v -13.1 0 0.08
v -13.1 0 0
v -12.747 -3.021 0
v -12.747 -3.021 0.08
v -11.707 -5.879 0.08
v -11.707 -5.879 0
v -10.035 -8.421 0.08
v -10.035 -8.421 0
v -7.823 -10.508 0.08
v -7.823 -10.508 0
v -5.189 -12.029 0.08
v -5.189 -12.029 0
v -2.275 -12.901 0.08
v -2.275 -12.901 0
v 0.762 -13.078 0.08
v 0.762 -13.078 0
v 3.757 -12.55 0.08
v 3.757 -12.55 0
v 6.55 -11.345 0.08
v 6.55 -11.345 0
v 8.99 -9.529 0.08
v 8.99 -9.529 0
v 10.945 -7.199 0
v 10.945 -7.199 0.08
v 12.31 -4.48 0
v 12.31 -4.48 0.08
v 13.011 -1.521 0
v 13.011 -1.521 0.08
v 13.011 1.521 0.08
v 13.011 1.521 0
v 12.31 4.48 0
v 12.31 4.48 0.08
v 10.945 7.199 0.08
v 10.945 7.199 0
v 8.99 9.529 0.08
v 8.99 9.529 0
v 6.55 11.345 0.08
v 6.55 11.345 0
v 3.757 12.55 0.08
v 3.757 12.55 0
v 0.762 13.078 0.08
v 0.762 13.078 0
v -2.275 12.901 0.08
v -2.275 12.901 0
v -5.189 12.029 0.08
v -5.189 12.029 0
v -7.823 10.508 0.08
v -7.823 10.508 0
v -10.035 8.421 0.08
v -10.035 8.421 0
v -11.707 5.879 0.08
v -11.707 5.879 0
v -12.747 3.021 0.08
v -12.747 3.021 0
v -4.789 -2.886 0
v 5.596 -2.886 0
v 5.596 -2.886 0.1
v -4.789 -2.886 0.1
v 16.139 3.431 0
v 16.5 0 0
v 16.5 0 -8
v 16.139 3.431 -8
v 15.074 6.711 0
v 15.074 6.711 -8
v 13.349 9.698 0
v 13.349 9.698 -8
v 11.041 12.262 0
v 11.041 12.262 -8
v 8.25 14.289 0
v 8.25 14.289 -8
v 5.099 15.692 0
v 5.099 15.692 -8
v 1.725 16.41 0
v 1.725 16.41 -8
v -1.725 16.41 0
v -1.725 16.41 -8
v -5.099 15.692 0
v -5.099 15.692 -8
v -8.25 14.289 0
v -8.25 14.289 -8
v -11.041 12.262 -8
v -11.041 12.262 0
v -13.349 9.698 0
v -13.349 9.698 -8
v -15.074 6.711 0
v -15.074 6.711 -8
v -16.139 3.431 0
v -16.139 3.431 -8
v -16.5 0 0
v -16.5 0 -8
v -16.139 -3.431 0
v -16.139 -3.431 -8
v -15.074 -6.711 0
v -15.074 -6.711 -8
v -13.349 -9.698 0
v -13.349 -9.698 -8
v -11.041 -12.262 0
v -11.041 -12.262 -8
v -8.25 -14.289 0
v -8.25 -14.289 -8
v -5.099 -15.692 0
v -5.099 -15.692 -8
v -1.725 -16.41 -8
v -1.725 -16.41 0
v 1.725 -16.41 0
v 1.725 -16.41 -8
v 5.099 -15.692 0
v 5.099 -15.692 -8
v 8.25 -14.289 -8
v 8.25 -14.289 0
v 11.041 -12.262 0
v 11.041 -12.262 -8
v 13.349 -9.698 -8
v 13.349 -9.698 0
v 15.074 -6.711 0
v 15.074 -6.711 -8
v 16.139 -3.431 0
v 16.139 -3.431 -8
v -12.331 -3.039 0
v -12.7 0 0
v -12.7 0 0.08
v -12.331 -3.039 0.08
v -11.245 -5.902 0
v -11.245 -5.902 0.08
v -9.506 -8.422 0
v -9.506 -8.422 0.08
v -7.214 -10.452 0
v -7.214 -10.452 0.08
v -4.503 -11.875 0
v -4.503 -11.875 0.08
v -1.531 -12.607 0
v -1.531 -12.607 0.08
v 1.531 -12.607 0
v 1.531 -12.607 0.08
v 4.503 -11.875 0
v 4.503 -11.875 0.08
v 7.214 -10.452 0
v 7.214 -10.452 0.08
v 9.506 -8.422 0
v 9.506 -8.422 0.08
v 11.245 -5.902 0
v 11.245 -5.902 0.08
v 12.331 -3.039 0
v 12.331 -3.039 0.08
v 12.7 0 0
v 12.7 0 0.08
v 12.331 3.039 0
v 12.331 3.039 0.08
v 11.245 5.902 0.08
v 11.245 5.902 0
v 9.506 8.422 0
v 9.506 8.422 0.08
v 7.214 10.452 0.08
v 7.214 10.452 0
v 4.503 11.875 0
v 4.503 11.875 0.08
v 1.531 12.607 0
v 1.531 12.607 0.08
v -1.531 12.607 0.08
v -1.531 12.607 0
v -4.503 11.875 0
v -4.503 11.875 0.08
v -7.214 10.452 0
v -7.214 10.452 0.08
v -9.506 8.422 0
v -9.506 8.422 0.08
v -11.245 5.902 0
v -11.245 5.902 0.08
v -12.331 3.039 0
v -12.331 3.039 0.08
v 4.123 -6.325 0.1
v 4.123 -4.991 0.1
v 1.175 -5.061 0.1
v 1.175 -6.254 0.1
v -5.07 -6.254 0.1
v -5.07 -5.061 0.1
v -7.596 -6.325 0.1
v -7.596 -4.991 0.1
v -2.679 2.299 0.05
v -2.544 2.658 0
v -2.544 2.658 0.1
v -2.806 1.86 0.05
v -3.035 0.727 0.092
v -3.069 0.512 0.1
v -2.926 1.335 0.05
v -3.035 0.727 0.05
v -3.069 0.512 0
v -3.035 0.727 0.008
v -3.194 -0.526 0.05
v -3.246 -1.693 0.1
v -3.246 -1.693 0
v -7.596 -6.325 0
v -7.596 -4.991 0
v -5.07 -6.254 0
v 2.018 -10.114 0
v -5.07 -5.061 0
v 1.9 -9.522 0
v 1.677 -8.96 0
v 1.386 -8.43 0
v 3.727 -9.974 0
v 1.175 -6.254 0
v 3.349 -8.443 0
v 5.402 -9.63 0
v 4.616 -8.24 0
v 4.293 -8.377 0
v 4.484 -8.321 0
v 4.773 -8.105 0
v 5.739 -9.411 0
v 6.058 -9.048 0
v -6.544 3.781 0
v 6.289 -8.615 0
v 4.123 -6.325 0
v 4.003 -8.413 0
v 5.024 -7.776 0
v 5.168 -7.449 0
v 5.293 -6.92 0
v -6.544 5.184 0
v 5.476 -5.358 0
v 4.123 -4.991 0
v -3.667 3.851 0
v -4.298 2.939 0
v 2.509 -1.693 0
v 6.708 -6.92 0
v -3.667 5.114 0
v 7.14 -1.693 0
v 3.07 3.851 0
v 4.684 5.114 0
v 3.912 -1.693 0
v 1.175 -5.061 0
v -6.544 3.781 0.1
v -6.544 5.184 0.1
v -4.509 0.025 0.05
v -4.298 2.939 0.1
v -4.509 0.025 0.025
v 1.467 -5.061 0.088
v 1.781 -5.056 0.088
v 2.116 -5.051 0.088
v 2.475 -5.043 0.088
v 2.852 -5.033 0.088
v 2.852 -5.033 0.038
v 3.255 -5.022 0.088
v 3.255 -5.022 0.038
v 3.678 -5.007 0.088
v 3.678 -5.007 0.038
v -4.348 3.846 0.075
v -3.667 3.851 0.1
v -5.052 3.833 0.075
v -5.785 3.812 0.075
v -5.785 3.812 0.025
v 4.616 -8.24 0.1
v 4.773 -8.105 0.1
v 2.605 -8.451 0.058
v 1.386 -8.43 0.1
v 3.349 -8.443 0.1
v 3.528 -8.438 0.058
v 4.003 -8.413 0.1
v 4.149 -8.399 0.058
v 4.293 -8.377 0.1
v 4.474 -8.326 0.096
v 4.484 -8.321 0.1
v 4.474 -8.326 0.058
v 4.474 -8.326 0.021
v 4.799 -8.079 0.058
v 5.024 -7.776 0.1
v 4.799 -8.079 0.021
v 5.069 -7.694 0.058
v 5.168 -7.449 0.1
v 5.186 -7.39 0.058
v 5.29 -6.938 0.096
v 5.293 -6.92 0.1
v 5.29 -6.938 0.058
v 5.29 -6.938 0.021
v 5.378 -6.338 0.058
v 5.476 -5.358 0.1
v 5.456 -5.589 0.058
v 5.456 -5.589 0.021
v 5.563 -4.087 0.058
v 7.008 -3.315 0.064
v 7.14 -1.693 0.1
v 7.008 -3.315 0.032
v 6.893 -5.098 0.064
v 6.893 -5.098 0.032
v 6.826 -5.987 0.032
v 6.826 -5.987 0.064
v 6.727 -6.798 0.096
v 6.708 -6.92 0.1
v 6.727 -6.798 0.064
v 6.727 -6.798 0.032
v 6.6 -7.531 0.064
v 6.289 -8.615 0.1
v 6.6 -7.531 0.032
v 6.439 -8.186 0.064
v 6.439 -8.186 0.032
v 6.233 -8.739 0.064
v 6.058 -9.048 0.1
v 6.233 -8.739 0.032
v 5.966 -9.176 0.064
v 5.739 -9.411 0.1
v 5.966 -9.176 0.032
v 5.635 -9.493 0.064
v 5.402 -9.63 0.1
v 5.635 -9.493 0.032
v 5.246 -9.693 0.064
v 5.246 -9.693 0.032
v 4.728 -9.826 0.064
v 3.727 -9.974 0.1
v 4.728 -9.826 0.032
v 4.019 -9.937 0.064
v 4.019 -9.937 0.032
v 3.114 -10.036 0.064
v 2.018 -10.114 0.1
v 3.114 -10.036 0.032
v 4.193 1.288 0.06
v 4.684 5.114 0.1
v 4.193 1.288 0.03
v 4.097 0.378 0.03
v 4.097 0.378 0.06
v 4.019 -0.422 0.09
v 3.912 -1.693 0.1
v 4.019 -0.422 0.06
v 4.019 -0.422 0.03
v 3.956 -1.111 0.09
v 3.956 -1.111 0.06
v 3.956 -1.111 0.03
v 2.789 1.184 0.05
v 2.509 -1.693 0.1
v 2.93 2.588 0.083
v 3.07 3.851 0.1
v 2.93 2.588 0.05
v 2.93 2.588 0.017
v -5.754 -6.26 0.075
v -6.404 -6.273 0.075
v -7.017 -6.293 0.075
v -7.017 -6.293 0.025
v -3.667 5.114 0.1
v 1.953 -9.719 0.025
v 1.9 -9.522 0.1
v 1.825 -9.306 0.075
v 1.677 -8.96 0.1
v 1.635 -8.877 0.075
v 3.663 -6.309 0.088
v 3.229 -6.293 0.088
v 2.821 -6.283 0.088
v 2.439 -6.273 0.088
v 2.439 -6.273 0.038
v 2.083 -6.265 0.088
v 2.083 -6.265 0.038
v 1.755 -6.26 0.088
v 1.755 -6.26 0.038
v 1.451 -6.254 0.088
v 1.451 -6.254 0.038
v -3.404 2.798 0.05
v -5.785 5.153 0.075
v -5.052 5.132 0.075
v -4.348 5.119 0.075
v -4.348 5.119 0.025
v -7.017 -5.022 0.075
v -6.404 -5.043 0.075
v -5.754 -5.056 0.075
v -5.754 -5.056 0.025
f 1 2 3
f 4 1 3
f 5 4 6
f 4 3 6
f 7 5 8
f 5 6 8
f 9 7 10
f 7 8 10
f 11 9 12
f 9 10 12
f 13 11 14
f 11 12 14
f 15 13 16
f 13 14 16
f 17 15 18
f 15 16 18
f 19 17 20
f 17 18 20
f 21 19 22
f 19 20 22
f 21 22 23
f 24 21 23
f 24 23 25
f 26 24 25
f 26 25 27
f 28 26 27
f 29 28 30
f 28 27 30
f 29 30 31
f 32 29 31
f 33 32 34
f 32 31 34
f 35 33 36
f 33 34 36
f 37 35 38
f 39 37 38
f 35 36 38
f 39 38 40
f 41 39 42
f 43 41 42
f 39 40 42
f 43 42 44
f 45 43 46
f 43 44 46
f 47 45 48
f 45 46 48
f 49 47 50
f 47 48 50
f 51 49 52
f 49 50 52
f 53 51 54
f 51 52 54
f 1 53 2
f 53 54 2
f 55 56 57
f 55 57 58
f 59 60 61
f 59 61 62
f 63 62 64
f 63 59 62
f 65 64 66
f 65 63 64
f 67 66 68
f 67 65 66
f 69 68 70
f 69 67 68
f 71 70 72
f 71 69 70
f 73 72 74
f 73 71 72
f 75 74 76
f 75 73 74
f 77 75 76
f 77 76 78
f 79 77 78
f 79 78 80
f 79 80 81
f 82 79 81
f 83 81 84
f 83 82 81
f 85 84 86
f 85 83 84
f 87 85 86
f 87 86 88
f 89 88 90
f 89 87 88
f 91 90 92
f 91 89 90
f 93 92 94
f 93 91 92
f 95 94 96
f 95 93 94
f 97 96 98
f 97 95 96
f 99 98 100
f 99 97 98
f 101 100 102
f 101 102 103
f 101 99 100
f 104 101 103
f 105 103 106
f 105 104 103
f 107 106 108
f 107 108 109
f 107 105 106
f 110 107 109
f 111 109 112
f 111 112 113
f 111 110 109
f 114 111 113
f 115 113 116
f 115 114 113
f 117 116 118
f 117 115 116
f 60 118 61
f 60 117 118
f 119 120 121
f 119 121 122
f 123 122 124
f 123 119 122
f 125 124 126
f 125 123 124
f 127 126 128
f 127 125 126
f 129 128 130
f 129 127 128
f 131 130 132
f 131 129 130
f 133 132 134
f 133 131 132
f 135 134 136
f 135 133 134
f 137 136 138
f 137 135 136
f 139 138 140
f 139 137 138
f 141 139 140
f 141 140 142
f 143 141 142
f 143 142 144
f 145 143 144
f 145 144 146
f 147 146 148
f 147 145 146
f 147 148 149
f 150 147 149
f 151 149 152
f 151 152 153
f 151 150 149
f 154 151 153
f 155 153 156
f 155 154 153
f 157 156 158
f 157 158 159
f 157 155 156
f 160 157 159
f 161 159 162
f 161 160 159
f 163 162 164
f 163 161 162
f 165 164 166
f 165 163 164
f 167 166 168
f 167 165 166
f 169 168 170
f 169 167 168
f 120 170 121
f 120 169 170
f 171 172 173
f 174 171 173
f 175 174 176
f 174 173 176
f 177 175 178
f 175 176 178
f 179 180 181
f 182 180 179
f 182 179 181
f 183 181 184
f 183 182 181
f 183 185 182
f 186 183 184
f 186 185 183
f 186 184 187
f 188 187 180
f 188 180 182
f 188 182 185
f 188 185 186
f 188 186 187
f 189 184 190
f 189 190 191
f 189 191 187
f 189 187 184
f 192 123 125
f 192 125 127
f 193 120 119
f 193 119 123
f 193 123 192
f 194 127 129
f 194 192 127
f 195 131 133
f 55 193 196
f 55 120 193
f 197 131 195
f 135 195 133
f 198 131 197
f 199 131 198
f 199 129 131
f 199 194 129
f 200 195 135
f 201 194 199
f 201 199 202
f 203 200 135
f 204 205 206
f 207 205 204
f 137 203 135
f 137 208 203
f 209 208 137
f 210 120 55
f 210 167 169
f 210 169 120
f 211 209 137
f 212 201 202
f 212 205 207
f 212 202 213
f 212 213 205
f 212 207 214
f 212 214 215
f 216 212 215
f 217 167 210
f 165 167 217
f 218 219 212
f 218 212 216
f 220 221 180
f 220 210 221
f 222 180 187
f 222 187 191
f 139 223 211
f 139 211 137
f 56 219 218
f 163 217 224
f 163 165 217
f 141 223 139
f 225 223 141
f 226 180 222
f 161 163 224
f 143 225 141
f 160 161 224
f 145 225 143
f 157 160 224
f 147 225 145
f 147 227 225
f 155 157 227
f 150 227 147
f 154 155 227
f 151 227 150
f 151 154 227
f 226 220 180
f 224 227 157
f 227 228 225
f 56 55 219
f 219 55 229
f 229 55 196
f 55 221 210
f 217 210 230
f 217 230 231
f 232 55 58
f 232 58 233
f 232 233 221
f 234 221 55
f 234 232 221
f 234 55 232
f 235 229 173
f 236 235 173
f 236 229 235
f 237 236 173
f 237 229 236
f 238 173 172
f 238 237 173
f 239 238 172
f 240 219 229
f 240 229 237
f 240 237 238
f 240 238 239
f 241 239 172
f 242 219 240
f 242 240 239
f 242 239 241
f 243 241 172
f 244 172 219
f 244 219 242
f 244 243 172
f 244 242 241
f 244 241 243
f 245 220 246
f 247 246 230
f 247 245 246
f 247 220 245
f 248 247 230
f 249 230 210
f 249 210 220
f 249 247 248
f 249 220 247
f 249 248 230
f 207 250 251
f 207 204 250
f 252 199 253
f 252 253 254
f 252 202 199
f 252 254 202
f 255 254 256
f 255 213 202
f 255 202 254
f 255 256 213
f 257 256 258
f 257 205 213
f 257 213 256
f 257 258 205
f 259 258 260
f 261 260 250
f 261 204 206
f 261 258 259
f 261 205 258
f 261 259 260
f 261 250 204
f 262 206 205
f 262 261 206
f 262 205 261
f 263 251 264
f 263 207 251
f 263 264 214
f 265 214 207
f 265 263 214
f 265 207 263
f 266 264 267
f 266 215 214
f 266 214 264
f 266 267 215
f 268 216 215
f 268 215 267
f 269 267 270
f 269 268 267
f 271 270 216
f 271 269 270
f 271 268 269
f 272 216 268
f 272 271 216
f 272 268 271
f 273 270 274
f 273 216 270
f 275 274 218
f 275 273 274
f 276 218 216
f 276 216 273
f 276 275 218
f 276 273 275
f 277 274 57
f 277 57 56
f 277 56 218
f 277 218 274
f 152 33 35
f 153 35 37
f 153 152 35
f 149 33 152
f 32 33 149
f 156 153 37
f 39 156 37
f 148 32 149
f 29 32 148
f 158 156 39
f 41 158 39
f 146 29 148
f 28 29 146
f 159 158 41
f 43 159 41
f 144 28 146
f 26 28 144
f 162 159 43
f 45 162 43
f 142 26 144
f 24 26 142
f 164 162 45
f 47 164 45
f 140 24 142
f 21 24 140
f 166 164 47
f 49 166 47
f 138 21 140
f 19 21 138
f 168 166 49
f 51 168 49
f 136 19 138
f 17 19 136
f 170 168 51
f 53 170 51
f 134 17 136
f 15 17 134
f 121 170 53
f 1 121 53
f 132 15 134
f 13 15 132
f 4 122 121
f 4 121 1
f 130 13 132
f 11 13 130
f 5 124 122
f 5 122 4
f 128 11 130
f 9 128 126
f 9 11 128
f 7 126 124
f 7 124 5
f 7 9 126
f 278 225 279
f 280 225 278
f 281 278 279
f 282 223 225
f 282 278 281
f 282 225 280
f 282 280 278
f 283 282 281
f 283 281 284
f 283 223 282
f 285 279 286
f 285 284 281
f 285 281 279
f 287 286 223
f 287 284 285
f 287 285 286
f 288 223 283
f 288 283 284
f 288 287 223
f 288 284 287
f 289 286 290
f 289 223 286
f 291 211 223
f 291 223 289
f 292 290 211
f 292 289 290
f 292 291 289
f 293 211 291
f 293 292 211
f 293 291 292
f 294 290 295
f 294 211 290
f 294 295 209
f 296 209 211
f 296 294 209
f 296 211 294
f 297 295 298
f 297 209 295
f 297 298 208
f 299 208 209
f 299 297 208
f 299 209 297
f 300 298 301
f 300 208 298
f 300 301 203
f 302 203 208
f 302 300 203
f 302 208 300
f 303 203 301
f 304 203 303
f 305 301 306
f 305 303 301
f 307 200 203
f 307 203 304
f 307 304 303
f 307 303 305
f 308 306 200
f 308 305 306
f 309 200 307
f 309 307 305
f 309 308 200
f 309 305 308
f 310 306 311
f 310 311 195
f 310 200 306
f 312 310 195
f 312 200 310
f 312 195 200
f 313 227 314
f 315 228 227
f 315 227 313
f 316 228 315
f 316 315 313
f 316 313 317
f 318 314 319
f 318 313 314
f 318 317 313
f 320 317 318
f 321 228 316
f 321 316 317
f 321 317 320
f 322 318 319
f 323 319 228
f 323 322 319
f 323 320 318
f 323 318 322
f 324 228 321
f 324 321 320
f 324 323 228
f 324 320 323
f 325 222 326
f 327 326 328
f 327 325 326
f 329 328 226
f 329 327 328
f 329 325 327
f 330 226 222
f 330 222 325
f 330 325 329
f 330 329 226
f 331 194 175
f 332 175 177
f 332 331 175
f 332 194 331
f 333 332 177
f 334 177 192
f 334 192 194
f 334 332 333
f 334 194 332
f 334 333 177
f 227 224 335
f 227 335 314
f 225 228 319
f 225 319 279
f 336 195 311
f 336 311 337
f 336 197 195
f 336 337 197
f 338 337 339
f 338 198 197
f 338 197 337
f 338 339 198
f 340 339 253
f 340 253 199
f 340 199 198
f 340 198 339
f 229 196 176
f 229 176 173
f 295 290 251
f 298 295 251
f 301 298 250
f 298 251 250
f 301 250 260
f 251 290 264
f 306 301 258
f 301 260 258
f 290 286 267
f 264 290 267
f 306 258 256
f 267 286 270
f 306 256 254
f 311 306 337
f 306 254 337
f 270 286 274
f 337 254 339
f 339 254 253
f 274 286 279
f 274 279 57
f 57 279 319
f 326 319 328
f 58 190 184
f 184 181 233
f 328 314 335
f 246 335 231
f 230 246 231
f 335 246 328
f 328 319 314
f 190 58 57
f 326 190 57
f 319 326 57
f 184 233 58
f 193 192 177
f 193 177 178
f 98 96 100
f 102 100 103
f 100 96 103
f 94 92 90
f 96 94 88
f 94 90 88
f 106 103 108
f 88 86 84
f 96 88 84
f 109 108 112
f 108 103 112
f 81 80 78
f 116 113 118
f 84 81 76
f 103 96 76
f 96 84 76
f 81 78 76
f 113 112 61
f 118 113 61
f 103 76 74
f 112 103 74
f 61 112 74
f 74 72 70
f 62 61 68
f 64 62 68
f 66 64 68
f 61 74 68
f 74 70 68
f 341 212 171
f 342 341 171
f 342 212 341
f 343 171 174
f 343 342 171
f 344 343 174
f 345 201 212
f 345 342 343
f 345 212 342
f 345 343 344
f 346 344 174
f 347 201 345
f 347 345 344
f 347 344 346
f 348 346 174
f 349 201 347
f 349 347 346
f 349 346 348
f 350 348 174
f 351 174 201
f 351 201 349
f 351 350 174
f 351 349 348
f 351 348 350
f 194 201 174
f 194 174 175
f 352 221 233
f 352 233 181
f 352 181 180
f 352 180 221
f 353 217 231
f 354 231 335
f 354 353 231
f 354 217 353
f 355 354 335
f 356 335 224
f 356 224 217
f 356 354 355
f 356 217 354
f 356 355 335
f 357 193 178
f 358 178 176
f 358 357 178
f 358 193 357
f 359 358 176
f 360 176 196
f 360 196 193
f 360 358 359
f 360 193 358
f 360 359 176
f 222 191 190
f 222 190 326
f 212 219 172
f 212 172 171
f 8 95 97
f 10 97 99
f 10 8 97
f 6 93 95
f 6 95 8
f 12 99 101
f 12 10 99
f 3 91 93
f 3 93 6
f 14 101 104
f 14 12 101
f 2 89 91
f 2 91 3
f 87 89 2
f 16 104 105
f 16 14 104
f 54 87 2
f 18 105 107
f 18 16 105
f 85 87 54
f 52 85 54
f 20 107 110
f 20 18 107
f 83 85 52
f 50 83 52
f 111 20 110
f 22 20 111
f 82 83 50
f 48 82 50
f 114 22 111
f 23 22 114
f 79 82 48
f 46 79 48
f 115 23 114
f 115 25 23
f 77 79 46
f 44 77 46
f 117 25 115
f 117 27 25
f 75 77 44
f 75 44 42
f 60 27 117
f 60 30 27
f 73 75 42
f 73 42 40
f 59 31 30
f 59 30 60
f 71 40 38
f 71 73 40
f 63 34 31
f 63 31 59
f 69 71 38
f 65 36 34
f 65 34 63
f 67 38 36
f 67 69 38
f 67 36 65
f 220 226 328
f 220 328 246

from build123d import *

# Parameters (mm, degrees)
SKETCH_1_R               = 16.5
DIAMETER33_HEIGHT8_DEPTH = 8
CHARACTER_DEPTH          = 0.1
SKETCH_3_R               = 13.1
SKETCH_3_R_2             = 12.7
INK_RING_DEPTH           = 0.08


with BuildPart() as part:
    # 草图1 → Diameter33_Height8 (new body)
    with BuildSketch(Plane.XY):
        Circle(SKETCH_1_R)
    extrude(amount=-DIAMETER33_HEIGHT8_DEPTH)

    # 草图2 → Character_马 (add)
    with BuildSketch(Plane.XY):
        with BuildLine():
            add(Edge.make_bspline(
                [(-2.543859649, 2.657894737), (-2.568109523, 2.601908638), (-2.618944351, 2.484545403), (-2.68091831, 2.29374228), (-2.747882739, 2.084905171), (-2.809197893, 1.853949883), (-2.867938942, 1.601351852), (-2.929388828, 1.329074257), (-2.981674213, 1.034530608), (-3.05538164, 0.620649676), (-3.127595616, 0.098084884), (-3.197623224, -0.517816396), (-3.237414282, -1.112851594), (-3.242919292, -1.502329954), (-3.245614035, -1.692982456)],
                knots=[0, 0, 0, 0, 0.495689669, 1.0391105, 1.629386371, 2.27856569, 2.980637221, 3.737641002, 4.547078417, 5.411969332, 7.15491927, 8.834024839, 10.450232028, 12, 12, 12, 12], degree=3))
            Line((-3.245614035, -1.692982456), (2.50877193, -1.692982456))
            add(Edge.make_bspline(
                [(2.50877193, -1.692982456), (2.555842668, -1.219109546), (2.651092154, -0.26020911), (2.765765857, 0.939059138), (2.857689962, 1.892225125), (2.928191701, 2.576627854), (2.997770846, 3.225611417), (3.046502797, 3.646446892), (3.070175439, 3.850877193)],
                knots=[0, 0, 0, 0, 1.538264342, 3.112738277, 3.891618687, 4.631513556, 5.335226919, 6, 6, 6, 6], degree=3))
            Line((3.070175439, 3.850877193), (-3.666666667, 3.850877193))
            add(Edge.make_bspline(
                [(-3.666666667, 3.850877193), (-3.893660384, 3.849684604), (-4.355478431, 3.847258285), (-5.06158577, 3.833290973), (-5.793776141, 3.813732), (-6.290908298, 3.791840575), (-6.543859649, 3.780701754)],
                knots=[0, 0, 0, 0, 0.946376728, 1.925400653, 2.944399995, 4, 4, 4, 4], degree=3))
            Line((-6.543859649, 3.780701754), (-6.543859649, 5.184210526))
            add(Edge.make_bspline(
                [(-6.543859649, 5.184210526), (-6.290908298, 5.173071706), (-5.793776141, 5.15118028), (-5.06158577, 5.131621308), (-4.355478431, 5.117653996), (-3.893660384, 5.115227677), (-3.666666667, 5.114035088)],
                knots=[0, 0, 0, 0, 1.055600005, 2.074599347, 3.053623272, 4, 4, 4, 4], degree=3))
            Line((-3.666666667, 5.114035088), (4.684210526, 5.114035088))
            add(Edge.make_bspline(
                [(4.684210526, 5.114035088), (4.594389665, 4.480170947), (4.4139847, 3.207056477), (4.243054526, 1.774416685), (4.14478495, 0.828967937), (4.097381465, 0.388144624), (4.055421695, -0.025950303), (4.020061293, -0.412530658), (3.985399458, -0.77104386), (3.956533585, -1.101987754), (3.933708028, -1.406199086), (3.919206962, -1.600281379), (3.912280702, -1.692982456)],
                knots=[0, 0, 0, 0, 2.802935976, 5.629689589, 6.316260642, 6.964711014, 7.570877404, 8.13855511, 8.664335647, 9.147876972, 9.592993668, 10, 10, 10, 10], degree=3))
            Line((3.912280702, -1.692982456), (7.140350877, -1.692982456))
            add(Edge.make_bspline(
                [(7.140350877, -1.692982456), (7.117496771, -1.957195671), (7.070752869, -2.497595555), (7.005207646, -3.329223298), (6.94597212, -4.200007765), (6.901683429, -4.946124678), (6.868307152, -5.546229635), (6.826684596, -5.980862849), (6.785382047, -6.39647152), (6.728695376, -6.792040318), (6.670245675, -7.168463089), (6.603590191, -7.526033406), (6.524025139, -7.862448123), (6.444320105, -8.179786345), (6.348007699, -8.470700422), (6.240664659, -8.735979197), (6.112879912, -8.969541099), (5.972363355, -9.176368475), (5.813514, -9.350805736), (5.639780874, -9.496502029), (5.450674708, -9.612389616), (5.239809272, -9.700393942), (4.996758723, -9.765827824), (4.713795659, -9.832208089), (4.381558555, -9.885783366), (4.002176073, -9.941267696), (3.574948301, -9.992657478), (3.098313267, -10.039000074), (2.574062445, -10.080415008), (2.208184758, -10.1025182), (2.01754386, -10.114035088)],
                knots=[0, 0, 0, 0, 1.887044686, 3.859605311, 5.935782741, 8.09729868, 9.178245636, 10.211890598, 11.203790184, 12.149721099, 13.054774096, 13.914409008, 14.736879022, 15.514410289, 16.241554355, 16.915874949, 17.547596075, 18.132428342, 18.691003543, 19.220627564, 19.740803274, 20.262911441, 20.840419939, 21.529816771, 22.330465222, 23.233668769, 24.258284961, 25.391864306, 26.641028549, 28, 28, 28, 28], degree=3))
            add(Edge.make_bspline(
                [(2.01754386, -10.114035088), (1.999634211, -9.981554353), (1.962380573, -9.705982807), (1.828075725, -9.291338106), (1.637078715, -8.859880402), (1.472081327, -8.577306965), (1.385964912, -8.429824561)],
                knots=[0, 0, 0, 0, 0.882983811, 1.83668375, 2.870909156, 4, 4, 4, 4], degree=3))
            add(Edge.make_bspline(
                [(1.385964912, -8.429824561), (1.601684871, -8.434299725), (2.00798008, -8.44272842), (2.580650352, -8.452457271), (3.078902343, -8.449896251), (3.50262546, -8.439476904), (3.851072115, -8.425325844), (4.125715661, -8.404487351), (4.325845969, -8.373466937), (4.498441923, -8.324930212), (4.647964297, -8.219854178), (4.806608465, -8.080366), (4.946574967, -7.900402806), (5.057213348, -7.72659571), (5.135709742, -7.551771137), (5.19099419, -7.380870408), (5.241966461, -7.171945715), (5.293801136, -6.927772939), (5.340465741, -6.64505285), (5.379651802, -6.325610866), (5.42315596, -5.969892033), (5.467875091, -5.457573461), (5.519200344, -4.8262348), (5.563244909, -4.113096685), (5.591709685, -3.474461181), (5.594963512, -3.073991037), (5.596491228, -2.885964912)],
                knots=[0, 0, 0, 0, 1.758141494, 3.31135083, 4.666771348, 5.817797705, 6.764703246, 7.508656711, 8.059921999, 8.414932624, 8.957450007, 9.527295967, 10.134772448, 10.806750365, 11.201697625, 11.692819884, 12.268105713, 12.953448137, 13.726378385, 14.601998413, 15.575707604, 16.646246692, 18.791940105, 20.736977137, 22.467966827, 24, 24, 24, 24], degree=3))
            Line((5.596491228, -2.885964912), (-4.789473684, -2.885964912))
            add(Edge.make_bspline(
                [(-4.789473684, -2.885964912), (-4.742500482, -2.409482331), (-4.646861986, -1.439353083), (-4.506084048, 0.025074391), (-4.381186338, 1.489718928), (-4.325531367, 2.461946264), (-4.298245614, 2.938596491)],
                knots=[0, 0, 0, 0, 0.982838397, 2.001081075, 3.019997563, 4, 4, 4, 4], degree=3))
            add(Edge.make_bspline(
                [(-4.298245614, 2.938596491), (-4.000143593, 2.892268938), (-3.414928922, 2.801321673), (-2.830558232, 2.705101429), (-2.543859649, 2.657894737)],
                knots=[0, 0, 0, 0, 1.018778359, 2, 2, 2, 2], degree=3))
        make_face()
        with BuildLine():
            add(Edge.make_bspline(
                [(1.175438596, -5.061403509), (1.272474939, -5.06183074), (1.474359506, -5.062719598), (1.787949201, -5.055481089), (2.124128563, -5.051460824), (2.48108109, -5.043574331), (2.860490404, -5.031942174), (3.261734399, -5.023647615), (3.685265265, -5.005984943), (3.974652272, -4.996224852), (4.122807018, -4.99122807)],
                knots=[0, 0, 0, 0, 0.789853886, 1.643294733, 2.553146486, 3.526589248, 4.549556957, 5.643022245, 6.793320254, 8, 8, 8, 8], degree=3))
            Line((4.122807018, -4.99122807), (4.122807018, -6.324561404))
            add(Edge.make_bspline(
                [(4.122807018, -6.324561404), (3.969453719, -6.319579397), (3.671400907, -6.309896522), (3.237471852, -6.292228161), (2.829302521, -6.283816356), (2.447289567, -6.272341119), (2.09207297, -6.264362463), (1.762823851, -6.260344735), (1.460498309, -6.253100348), (1.267276772, -6.253971776), (1.175438596, -6.254385965)],
                knots=[0, 0, 0, 0, 1.248975298, 2.427470434, 3.535041912, 4.572114753, 5.538512415, 6.427215019, 7.252455469, 8, 8, 8, 8], degree=3))
            Line((1.175438596, -6.254385965), (-5.070175439, -6.254385965))
            add(Edge.make_bspline(
                [(-5.070175439, -6.254385965), (-5.298037146, -6.255493864), (-5.742534486, -6.257655079), (-6.391477007, -6.271227092), (-7.005930309, -6.290151347), (-7.403331701, -6.313306629), (-7.596491228, -6.324561404)],
                knots=[0, 0, 0, 0, 1.081761786, 2.110228356, 3.081464224, 4, 4, 4, 4], degree=3))
            Line((-7.596491228, -6.324561404), (-7.596491228, -4.99122807))
            add(Edge.make_bspline(
                [(-7.596491228, -4.99122807), (-7.403331701, -5.002482845), (-7.005930309, -5.025638127), (-6.391477007, -5.044562382), (-5.742534486, -5.058134395), (-5.298037146, -5.06029561), (-5.070175439, -5.061403509)],
                knots=[0, 0, 0, 0, 0.918535776, 1.889771644, 2.918238214, 4, 4, 4, 4], degree=3))
            Line((-5.070175439, -5.061403509), (1.175438596, -5.061403509))
        make_face()
    extrude(amount=CHARACTER_DEPTH)

    # 草图3 → Ink_ring (add)
    with BuildSketch(Plane.XY):
        with Locations(Location((0, 0, 0), (0, 0, 180))):
            Circle(SKETCH_3_R)
        with Locations(Location((0, 0, 0), (0, 0, 180))):
            Circle(SKETCH_3_R_2, mode=Mode.SUBTRACT)
    extrude(amount=INK_RING_DEPTH)


solid = part.part
